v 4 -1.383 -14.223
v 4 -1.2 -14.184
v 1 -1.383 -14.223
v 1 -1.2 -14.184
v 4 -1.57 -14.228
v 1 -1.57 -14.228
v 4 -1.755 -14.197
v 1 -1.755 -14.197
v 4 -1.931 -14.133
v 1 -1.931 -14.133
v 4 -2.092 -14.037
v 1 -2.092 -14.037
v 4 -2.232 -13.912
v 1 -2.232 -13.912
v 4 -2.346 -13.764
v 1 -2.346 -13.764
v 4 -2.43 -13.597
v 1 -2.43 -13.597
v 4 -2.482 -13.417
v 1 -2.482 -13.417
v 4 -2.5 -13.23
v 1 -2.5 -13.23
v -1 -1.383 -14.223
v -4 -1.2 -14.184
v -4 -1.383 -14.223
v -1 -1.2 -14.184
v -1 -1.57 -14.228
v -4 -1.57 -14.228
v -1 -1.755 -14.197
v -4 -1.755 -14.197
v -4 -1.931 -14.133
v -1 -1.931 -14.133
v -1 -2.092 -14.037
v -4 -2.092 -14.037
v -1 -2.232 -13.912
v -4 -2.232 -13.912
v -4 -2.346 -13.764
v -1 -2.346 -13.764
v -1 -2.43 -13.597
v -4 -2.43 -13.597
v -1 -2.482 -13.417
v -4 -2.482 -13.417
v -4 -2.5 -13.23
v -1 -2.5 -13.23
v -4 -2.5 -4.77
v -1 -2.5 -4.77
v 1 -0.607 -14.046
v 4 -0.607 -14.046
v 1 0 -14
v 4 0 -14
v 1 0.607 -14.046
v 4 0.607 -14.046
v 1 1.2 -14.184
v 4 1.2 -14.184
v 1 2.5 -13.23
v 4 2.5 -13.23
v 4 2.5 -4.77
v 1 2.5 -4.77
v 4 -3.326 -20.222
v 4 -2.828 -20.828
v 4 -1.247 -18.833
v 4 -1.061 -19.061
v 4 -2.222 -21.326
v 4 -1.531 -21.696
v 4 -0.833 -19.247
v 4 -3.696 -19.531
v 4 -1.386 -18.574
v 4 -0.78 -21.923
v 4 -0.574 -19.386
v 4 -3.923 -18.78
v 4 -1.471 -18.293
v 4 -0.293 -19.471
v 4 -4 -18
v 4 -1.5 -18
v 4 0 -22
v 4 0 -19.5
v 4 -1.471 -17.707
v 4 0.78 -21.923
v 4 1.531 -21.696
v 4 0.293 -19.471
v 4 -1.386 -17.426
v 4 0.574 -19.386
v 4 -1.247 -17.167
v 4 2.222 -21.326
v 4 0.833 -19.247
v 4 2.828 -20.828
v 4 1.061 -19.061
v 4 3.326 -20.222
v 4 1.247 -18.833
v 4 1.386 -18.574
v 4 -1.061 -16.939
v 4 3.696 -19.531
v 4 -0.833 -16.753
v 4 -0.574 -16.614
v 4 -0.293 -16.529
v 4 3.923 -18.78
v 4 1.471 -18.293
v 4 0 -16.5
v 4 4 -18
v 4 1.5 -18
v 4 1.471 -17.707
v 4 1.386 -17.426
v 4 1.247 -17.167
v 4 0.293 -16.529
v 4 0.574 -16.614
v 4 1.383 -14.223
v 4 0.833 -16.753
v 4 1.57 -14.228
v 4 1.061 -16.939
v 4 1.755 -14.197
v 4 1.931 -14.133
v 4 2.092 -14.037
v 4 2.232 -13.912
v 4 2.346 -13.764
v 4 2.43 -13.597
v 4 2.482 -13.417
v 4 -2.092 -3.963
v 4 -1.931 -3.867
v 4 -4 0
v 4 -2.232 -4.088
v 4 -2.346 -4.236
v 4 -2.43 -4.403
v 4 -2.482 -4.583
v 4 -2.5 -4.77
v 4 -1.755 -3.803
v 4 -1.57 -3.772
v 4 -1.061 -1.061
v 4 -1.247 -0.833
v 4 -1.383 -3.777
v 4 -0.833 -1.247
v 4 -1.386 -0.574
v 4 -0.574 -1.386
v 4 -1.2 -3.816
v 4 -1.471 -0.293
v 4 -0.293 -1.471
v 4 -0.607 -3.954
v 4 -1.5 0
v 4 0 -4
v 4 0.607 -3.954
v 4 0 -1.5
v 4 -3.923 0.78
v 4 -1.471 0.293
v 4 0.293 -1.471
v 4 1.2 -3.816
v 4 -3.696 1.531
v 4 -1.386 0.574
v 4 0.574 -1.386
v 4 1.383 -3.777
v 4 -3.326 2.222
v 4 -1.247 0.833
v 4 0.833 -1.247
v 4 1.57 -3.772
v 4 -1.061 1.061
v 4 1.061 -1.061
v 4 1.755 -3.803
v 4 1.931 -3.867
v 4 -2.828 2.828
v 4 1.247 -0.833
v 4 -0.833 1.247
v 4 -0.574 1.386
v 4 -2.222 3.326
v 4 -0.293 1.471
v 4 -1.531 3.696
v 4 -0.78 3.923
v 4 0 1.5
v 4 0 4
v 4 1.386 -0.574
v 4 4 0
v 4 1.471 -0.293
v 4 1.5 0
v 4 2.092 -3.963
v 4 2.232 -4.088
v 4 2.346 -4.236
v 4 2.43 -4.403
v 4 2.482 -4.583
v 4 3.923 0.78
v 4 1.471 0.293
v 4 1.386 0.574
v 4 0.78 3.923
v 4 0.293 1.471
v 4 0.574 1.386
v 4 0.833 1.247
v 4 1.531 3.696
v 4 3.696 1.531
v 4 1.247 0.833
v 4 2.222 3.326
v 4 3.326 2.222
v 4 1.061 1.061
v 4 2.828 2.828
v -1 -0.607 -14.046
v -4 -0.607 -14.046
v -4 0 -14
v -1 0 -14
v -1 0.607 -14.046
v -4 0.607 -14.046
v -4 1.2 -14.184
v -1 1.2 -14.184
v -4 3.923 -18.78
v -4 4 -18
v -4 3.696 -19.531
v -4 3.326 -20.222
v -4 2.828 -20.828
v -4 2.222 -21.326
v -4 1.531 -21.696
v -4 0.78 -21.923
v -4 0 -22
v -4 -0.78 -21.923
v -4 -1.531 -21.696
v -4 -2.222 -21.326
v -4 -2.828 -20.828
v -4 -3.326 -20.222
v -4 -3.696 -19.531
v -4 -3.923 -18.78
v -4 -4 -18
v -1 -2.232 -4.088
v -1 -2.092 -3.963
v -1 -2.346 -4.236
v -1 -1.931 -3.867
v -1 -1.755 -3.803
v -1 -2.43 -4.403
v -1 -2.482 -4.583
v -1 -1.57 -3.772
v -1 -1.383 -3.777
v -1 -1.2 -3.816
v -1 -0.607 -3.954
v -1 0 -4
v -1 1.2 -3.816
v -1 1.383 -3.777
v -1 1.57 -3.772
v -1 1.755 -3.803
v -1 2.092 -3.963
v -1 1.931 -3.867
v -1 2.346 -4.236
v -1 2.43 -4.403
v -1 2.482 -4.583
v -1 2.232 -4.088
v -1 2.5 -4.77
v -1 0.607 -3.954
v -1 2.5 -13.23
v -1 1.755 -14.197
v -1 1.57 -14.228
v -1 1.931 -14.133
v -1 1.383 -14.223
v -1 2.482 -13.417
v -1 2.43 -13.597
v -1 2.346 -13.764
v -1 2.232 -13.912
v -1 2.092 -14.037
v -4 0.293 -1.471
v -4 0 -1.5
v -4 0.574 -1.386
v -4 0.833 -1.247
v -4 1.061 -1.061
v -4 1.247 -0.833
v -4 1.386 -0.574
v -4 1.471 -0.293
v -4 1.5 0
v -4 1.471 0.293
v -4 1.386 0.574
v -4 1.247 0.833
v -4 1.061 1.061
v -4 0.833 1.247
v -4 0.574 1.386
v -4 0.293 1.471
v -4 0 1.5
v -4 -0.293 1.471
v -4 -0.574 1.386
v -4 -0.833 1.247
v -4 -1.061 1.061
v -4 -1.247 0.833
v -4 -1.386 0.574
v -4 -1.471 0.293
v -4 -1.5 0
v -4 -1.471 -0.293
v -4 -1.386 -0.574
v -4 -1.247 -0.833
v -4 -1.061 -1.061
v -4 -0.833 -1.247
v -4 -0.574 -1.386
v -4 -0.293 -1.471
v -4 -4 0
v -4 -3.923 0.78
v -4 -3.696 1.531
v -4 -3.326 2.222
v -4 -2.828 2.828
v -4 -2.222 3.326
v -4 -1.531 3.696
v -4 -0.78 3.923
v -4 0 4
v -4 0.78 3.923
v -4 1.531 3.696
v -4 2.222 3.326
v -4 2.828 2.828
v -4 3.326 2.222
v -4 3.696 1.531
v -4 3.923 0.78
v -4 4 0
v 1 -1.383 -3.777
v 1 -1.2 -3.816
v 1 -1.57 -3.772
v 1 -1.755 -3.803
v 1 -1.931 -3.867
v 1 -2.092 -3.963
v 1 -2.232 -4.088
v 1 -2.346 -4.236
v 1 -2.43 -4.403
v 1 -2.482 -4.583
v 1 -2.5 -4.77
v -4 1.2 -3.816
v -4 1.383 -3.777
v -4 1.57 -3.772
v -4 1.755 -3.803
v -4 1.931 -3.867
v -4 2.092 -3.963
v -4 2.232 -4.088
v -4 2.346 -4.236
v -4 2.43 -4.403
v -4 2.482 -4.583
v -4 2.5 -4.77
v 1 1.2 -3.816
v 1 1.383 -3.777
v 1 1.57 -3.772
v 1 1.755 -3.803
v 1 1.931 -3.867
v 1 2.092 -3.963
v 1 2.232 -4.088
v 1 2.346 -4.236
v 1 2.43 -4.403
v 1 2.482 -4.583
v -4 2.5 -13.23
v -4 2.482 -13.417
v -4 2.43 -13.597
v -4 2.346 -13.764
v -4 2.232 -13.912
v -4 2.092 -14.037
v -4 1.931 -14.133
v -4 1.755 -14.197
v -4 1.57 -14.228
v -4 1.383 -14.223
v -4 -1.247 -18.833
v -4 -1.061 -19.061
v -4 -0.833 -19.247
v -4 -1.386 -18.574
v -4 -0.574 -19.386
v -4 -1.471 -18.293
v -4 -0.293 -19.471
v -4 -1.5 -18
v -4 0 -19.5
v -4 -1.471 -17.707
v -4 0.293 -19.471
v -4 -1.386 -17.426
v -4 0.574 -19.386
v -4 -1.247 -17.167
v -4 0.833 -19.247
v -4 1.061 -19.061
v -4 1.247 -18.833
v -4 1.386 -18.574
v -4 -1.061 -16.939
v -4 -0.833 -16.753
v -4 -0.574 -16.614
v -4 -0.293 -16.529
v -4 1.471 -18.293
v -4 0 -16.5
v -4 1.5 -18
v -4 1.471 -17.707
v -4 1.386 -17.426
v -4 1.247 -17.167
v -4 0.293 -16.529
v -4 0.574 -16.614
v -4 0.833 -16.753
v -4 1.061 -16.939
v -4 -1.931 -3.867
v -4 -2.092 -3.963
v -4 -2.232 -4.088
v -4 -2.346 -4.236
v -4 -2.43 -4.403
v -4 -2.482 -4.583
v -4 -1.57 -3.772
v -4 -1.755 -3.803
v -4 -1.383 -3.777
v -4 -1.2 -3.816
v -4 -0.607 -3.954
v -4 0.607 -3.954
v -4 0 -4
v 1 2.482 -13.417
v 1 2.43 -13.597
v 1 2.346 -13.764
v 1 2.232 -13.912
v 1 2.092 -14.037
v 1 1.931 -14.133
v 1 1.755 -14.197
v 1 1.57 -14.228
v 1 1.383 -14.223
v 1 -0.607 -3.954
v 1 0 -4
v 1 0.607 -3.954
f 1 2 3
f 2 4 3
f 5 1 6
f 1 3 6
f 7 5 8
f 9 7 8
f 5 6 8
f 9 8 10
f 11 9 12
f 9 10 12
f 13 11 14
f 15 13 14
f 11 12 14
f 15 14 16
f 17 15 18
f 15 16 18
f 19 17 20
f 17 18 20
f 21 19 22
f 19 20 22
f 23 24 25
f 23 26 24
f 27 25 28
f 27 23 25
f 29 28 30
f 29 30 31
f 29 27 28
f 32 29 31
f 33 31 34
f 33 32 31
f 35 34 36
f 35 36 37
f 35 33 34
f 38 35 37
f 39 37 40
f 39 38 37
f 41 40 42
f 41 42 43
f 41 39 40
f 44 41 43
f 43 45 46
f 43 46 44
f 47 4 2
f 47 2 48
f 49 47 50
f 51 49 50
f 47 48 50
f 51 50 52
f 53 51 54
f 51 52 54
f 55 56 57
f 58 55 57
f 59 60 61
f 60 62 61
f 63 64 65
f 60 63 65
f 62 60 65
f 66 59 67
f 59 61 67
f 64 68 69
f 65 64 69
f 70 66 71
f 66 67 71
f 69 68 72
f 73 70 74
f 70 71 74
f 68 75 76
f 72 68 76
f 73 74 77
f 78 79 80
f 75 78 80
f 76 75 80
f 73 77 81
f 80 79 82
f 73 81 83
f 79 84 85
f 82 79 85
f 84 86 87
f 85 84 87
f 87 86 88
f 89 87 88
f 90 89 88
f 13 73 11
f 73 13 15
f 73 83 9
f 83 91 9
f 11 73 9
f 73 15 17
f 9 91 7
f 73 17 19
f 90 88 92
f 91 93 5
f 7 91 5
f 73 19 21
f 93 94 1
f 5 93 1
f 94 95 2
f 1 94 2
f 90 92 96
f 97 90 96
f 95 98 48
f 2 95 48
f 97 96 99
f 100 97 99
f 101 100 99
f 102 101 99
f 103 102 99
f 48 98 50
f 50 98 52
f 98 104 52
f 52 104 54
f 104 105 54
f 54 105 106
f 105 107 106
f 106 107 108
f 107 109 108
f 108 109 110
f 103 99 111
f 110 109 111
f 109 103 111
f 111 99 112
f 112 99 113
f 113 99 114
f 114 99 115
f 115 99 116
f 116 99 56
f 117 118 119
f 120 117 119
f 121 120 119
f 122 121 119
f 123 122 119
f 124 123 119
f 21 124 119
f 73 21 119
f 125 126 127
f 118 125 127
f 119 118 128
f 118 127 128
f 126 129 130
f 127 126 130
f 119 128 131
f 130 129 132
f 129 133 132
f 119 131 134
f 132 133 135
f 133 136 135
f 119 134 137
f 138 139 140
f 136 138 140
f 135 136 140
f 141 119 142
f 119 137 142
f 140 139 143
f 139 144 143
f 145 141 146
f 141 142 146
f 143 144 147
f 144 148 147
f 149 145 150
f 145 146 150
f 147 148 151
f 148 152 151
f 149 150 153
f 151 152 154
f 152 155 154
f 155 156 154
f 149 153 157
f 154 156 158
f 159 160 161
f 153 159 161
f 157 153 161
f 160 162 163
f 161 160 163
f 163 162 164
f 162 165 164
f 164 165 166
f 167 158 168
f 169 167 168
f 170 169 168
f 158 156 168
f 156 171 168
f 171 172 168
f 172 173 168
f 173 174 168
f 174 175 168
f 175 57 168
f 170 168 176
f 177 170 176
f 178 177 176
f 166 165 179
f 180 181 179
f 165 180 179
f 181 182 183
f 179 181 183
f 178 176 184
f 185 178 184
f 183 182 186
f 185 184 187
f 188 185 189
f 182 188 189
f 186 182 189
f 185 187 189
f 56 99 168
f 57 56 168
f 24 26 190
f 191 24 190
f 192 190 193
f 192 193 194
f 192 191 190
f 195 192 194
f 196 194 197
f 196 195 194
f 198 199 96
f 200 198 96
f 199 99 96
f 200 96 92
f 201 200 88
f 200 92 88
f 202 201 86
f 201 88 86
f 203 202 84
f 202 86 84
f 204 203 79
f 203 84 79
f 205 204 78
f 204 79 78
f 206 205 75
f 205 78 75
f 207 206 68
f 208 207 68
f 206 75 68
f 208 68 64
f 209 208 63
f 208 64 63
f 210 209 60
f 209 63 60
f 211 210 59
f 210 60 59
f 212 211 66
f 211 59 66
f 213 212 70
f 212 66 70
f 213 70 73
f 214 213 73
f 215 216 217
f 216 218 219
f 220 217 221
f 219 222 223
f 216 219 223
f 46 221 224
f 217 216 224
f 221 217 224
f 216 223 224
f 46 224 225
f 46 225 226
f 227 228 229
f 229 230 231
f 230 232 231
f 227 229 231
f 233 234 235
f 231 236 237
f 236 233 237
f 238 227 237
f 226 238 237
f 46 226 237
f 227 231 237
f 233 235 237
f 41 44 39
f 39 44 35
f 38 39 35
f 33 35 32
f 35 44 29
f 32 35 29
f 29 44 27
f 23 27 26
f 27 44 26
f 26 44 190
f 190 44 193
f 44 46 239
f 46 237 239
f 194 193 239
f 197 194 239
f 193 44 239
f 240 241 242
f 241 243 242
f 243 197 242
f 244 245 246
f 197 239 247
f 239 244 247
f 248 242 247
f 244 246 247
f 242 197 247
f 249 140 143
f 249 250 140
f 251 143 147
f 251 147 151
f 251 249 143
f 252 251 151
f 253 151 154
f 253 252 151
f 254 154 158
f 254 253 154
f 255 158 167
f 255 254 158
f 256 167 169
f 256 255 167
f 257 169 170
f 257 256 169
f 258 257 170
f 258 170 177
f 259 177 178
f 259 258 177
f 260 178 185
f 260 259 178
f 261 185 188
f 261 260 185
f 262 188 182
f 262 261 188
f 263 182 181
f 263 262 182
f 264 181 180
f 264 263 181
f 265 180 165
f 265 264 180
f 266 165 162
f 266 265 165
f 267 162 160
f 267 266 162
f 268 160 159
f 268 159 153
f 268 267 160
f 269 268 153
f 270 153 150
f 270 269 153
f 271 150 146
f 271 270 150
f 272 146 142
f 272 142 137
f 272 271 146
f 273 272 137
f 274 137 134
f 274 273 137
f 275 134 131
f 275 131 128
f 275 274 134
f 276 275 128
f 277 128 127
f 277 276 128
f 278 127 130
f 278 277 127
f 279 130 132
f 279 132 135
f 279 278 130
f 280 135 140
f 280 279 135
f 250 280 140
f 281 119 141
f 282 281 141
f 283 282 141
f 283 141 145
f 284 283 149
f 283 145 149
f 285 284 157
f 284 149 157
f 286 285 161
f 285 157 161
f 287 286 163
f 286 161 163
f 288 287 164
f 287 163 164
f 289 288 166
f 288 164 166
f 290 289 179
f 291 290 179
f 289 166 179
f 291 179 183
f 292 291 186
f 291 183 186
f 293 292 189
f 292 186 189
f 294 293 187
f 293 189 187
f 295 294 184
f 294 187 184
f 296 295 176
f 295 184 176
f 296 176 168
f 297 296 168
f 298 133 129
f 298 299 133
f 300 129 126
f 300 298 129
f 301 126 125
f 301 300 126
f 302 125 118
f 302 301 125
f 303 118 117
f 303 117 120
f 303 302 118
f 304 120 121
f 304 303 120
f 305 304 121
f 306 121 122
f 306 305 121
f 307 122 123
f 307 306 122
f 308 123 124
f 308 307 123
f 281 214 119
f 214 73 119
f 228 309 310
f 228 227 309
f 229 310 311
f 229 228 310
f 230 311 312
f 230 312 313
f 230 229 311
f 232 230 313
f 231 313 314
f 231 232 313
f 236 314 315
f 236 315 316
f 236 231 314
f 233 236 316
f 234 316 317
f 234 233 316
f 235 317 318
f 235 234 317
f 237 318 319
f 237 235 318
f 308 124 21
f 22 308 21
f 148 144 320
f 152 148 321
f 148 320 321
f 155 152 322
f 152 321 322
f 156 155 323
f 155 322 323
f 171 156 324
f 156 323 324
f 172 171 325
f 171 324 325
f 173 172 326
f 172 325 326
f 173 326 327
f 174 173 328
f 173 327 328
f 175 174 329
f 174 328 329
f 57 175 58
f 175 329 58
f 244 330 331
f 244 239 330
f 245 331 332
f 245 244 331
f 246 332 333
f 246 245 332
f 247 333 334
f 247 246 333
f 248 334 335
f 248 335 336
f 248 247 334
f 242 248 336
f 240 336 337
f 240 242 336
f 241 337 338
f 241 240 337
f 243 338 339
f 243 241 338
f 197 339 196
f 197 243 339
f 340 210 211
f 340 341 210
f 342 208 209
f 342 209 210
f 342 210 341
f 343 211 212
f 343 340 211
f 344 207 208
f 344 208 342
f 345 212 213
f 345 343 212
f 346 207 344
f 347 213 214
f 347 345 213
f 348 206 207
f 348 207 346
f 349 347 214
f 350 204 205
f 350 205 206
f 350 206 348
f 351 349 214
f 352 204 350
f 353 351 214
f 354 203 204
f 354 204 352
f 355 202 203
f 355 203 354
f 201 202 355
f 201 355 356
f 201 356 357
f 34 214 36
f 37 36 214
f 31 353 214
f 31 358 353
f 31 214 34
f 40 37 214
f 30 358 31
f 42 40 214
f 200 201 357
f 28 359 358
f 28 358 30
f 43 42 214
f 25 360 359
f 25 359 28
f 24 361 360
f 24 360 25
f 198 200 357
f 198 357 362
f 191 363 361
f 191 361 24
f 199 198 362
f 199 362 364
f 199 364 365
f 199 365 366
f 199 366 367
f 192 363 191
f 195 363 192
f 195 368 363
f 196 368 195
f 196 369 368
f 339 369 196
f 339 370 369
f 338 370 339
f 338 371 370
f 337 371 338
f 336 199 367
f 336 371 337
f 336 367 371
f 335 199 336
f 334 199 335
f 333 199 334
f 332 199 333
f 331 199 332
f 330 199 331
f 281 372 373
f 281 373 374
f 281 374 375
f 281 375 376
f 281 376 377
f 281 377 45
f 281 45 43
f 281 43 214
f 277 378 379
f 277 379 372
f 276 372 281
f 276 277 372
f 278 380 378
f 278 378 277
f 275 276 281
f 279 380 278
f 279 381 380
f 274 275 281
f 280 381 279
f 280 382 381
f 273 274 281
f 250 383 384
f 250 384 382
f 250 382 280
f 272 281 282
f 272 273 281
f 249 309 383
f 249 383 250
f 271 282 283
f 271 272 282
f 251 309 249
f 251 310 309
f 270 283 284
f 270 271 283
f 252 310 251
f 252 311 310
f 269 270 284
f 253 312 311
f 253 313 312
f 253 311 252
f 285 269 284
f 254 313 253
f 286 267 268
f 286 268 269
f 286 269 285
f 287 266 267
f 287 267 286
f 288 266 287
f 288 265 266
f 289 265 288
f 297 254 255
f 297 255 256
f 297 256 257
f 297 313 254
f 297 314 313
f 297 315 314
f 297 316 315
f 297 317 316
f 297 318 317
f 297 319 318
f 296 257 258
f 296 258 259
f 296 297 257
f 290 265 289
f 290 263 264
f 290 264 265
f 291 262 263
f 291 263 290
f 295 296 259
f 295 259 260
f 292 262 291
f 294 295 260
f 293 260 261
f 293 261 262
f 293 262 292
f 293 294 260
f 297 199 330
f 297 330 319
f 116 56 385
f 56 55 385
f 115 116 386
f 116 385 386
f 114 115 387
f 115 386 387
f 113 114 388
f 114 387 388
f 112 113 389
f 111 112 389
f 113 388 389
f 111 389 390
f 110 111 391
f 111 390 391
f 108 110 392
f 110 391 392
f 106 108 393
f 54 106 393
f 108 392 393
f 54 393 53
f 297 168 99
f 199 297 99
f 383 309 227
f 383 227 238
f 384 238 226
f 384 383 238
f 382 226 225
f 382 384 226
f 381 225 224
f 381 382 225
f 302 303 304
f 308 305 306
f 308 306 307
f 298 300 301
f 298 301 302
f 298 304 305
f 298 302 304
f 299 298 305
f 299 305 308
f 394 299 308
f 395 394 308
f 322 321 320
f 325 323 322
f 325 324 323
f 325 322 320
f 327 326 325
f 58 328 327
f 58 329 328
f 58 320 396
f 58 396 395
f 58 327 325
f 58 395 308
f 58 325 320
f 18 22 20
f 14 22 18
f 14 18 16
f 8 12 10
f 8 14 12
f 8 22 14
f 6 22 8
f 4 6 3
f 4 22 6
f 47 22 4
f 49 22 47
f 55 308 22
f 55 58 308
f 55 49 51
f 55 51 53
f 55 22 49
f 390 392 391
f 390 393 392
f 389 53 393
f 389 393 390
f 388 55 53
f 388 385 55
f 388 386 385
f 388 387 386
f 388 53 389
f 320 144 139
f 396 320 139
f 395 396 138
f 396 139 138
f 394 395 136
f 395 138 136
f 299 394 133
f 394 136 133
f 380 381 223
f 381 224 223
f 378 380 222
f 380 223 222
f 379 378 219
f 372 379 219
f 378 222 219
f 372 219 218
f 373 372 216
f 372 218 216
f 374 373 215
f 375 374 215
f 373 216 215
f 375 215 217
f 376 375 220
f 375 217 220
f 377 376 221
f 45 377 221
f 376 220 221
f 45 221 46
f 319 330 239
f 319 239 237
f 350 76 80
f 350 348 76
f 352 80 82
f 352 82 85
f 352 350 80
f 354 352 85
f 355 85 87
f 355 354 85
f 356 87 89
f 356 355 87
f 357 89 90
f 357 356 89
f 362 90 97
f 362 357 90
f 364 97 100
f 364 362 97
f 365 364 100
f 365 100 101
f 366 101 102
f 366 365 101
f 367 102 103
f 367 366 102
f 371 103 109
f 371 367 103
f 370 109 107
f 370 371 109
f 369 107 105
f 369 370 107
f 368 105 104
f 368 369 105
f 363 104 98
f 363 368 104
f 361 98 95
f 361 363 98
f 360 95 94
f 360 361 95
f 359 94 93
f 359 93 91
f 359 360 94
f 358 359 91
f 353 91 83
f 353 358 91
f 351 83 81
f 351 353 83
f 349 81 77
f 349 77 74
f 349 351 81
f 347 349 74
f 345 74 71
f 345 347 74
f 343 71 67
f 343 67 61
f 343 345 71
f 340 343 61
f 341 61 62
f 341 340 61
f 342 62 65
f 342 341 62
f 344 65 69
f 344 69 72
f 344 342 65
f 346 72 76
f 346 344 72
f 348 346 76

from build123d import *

# Parameters (mm, degrees)
SKETCH_1_R          = 1.5
EXTRUDE_1_DEPTH     = 4
CUT_EXTRUDE_1_DEPTH = 3
FILLET_1_R          = 1


with BuildPart() as part:
    # 草图1 → 凸台-拉伸1 (new, symmetric)
    with BuildSketch(Plane(origin=(0, 0, 0), x_dir=(0, 0, -1), z_dir=(1, 0, 0))):
        with BuildLine():
            Line((0, 4), (18, 4))
            ThreePointArc((18, 4), (22, 0), (18, -4))
            Line((18, -4), (0, -4))
            ThreePointArc((0, -4), (-4, 0), (0, 4))
        make_face()
        Circle(SKETCH_1_R, mode=Mode.SUBTRACT)
        with Locations((18, 0)):
            Circle(SKETCH_1_R, mode=Mode.SUBTRACT)
    extrude(amount=EXTRUDE_1_DEPTH, both=True)

    # 草图2 → 切除-拉伸1 (cut)
    with BuildSketch(Plane(origin=(4, 0, 0), x_dir=(0, 0, -1), z_dir=(1, 0, 0))):
        with BuildLine():
            Line((3.122498999, -2.5), (14.877501001, -2.5))
            ThreePointArc((14.877501001, -2.5), (14, 0), (14.877501001, 2.5))
            Line((14.877501001, 2.5), (3.122498999, 2.5))
            ThreePointArc((3.122498999, 2.5), (4, 0), (3.122498999, -2.5))
        make_face()
    cut_extrude_1 = extrude(amount=-CUT_EXTRUDE_1_DEPTH, mode=Mode.SUBTRACT)

    # 镜向1: 切除-拉伸1 across plane
    add(cut_extrude_1.mirror(Plane(origin=(0, 0, 0), x_dir=(0, 0, 1), z_dir=(1, 0, 0))), mode=Mode.SUBTRACT)

    # 圆角1
    fillet_1_edges = [part.edges().sort_by_distance(p)[0] for p in [
        (2.5, 2.5, -14.877501001),
        (2.5, -2.5, -14.877501001),
        (2.5, -2.5, -3.122498999),
        (2.5, 2.5, -3.122498999),
        (-2.5, -2.5, -14.877501001),
        (-2.5, 2.5, -14.877501001),
        (-2.5, 2.5, -3.122498999),
        (-2.5, -2.5, -3.122498999),
    ]]
    fillet(fillet_1_edges, radius=FILLET_1_R)


solid = part.part
